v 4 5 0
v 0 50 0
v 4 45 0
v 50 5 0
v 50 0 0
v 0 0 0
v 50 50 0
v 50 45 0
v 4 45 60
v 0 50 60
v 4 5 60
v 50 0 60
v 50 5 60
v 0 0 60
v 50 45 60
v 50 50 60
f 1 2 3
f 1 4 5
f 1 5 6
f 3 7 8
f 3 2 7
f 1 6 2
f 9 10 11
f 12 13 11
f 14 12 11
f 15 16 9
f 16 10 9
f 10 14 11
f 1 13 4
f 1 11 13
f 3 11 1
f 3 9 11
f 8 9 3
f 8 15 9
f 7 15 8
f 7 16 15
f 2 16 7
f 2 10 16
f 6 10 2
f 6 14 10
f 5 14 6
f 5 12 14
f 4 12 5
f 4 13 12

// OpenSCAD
$fn = 32;

// ----------------------------------------------------------------------
// Structural section: channel 50 x 50 mm
// ----------------------------------------------------------------------

// --- parameters (mm) ---
sec_w = 50;               // channel width, X
sec_h = 50;               // channel height, Y
flange_t = 5;             // flange thickness
web_t = 4;                // web thickness
plate_t = 60;             // cut length, Z (extrusion height)

profile = [[0, 0], [50, 0], [50, 5], [4, 5], [4, 45], [50, 45], [50, 50], [0, 50]];  // primary outline, 8 points, counter clockwise

// --- the one profile operation ---
linear_extrude(height = plate_t) polygon(points = profile);
